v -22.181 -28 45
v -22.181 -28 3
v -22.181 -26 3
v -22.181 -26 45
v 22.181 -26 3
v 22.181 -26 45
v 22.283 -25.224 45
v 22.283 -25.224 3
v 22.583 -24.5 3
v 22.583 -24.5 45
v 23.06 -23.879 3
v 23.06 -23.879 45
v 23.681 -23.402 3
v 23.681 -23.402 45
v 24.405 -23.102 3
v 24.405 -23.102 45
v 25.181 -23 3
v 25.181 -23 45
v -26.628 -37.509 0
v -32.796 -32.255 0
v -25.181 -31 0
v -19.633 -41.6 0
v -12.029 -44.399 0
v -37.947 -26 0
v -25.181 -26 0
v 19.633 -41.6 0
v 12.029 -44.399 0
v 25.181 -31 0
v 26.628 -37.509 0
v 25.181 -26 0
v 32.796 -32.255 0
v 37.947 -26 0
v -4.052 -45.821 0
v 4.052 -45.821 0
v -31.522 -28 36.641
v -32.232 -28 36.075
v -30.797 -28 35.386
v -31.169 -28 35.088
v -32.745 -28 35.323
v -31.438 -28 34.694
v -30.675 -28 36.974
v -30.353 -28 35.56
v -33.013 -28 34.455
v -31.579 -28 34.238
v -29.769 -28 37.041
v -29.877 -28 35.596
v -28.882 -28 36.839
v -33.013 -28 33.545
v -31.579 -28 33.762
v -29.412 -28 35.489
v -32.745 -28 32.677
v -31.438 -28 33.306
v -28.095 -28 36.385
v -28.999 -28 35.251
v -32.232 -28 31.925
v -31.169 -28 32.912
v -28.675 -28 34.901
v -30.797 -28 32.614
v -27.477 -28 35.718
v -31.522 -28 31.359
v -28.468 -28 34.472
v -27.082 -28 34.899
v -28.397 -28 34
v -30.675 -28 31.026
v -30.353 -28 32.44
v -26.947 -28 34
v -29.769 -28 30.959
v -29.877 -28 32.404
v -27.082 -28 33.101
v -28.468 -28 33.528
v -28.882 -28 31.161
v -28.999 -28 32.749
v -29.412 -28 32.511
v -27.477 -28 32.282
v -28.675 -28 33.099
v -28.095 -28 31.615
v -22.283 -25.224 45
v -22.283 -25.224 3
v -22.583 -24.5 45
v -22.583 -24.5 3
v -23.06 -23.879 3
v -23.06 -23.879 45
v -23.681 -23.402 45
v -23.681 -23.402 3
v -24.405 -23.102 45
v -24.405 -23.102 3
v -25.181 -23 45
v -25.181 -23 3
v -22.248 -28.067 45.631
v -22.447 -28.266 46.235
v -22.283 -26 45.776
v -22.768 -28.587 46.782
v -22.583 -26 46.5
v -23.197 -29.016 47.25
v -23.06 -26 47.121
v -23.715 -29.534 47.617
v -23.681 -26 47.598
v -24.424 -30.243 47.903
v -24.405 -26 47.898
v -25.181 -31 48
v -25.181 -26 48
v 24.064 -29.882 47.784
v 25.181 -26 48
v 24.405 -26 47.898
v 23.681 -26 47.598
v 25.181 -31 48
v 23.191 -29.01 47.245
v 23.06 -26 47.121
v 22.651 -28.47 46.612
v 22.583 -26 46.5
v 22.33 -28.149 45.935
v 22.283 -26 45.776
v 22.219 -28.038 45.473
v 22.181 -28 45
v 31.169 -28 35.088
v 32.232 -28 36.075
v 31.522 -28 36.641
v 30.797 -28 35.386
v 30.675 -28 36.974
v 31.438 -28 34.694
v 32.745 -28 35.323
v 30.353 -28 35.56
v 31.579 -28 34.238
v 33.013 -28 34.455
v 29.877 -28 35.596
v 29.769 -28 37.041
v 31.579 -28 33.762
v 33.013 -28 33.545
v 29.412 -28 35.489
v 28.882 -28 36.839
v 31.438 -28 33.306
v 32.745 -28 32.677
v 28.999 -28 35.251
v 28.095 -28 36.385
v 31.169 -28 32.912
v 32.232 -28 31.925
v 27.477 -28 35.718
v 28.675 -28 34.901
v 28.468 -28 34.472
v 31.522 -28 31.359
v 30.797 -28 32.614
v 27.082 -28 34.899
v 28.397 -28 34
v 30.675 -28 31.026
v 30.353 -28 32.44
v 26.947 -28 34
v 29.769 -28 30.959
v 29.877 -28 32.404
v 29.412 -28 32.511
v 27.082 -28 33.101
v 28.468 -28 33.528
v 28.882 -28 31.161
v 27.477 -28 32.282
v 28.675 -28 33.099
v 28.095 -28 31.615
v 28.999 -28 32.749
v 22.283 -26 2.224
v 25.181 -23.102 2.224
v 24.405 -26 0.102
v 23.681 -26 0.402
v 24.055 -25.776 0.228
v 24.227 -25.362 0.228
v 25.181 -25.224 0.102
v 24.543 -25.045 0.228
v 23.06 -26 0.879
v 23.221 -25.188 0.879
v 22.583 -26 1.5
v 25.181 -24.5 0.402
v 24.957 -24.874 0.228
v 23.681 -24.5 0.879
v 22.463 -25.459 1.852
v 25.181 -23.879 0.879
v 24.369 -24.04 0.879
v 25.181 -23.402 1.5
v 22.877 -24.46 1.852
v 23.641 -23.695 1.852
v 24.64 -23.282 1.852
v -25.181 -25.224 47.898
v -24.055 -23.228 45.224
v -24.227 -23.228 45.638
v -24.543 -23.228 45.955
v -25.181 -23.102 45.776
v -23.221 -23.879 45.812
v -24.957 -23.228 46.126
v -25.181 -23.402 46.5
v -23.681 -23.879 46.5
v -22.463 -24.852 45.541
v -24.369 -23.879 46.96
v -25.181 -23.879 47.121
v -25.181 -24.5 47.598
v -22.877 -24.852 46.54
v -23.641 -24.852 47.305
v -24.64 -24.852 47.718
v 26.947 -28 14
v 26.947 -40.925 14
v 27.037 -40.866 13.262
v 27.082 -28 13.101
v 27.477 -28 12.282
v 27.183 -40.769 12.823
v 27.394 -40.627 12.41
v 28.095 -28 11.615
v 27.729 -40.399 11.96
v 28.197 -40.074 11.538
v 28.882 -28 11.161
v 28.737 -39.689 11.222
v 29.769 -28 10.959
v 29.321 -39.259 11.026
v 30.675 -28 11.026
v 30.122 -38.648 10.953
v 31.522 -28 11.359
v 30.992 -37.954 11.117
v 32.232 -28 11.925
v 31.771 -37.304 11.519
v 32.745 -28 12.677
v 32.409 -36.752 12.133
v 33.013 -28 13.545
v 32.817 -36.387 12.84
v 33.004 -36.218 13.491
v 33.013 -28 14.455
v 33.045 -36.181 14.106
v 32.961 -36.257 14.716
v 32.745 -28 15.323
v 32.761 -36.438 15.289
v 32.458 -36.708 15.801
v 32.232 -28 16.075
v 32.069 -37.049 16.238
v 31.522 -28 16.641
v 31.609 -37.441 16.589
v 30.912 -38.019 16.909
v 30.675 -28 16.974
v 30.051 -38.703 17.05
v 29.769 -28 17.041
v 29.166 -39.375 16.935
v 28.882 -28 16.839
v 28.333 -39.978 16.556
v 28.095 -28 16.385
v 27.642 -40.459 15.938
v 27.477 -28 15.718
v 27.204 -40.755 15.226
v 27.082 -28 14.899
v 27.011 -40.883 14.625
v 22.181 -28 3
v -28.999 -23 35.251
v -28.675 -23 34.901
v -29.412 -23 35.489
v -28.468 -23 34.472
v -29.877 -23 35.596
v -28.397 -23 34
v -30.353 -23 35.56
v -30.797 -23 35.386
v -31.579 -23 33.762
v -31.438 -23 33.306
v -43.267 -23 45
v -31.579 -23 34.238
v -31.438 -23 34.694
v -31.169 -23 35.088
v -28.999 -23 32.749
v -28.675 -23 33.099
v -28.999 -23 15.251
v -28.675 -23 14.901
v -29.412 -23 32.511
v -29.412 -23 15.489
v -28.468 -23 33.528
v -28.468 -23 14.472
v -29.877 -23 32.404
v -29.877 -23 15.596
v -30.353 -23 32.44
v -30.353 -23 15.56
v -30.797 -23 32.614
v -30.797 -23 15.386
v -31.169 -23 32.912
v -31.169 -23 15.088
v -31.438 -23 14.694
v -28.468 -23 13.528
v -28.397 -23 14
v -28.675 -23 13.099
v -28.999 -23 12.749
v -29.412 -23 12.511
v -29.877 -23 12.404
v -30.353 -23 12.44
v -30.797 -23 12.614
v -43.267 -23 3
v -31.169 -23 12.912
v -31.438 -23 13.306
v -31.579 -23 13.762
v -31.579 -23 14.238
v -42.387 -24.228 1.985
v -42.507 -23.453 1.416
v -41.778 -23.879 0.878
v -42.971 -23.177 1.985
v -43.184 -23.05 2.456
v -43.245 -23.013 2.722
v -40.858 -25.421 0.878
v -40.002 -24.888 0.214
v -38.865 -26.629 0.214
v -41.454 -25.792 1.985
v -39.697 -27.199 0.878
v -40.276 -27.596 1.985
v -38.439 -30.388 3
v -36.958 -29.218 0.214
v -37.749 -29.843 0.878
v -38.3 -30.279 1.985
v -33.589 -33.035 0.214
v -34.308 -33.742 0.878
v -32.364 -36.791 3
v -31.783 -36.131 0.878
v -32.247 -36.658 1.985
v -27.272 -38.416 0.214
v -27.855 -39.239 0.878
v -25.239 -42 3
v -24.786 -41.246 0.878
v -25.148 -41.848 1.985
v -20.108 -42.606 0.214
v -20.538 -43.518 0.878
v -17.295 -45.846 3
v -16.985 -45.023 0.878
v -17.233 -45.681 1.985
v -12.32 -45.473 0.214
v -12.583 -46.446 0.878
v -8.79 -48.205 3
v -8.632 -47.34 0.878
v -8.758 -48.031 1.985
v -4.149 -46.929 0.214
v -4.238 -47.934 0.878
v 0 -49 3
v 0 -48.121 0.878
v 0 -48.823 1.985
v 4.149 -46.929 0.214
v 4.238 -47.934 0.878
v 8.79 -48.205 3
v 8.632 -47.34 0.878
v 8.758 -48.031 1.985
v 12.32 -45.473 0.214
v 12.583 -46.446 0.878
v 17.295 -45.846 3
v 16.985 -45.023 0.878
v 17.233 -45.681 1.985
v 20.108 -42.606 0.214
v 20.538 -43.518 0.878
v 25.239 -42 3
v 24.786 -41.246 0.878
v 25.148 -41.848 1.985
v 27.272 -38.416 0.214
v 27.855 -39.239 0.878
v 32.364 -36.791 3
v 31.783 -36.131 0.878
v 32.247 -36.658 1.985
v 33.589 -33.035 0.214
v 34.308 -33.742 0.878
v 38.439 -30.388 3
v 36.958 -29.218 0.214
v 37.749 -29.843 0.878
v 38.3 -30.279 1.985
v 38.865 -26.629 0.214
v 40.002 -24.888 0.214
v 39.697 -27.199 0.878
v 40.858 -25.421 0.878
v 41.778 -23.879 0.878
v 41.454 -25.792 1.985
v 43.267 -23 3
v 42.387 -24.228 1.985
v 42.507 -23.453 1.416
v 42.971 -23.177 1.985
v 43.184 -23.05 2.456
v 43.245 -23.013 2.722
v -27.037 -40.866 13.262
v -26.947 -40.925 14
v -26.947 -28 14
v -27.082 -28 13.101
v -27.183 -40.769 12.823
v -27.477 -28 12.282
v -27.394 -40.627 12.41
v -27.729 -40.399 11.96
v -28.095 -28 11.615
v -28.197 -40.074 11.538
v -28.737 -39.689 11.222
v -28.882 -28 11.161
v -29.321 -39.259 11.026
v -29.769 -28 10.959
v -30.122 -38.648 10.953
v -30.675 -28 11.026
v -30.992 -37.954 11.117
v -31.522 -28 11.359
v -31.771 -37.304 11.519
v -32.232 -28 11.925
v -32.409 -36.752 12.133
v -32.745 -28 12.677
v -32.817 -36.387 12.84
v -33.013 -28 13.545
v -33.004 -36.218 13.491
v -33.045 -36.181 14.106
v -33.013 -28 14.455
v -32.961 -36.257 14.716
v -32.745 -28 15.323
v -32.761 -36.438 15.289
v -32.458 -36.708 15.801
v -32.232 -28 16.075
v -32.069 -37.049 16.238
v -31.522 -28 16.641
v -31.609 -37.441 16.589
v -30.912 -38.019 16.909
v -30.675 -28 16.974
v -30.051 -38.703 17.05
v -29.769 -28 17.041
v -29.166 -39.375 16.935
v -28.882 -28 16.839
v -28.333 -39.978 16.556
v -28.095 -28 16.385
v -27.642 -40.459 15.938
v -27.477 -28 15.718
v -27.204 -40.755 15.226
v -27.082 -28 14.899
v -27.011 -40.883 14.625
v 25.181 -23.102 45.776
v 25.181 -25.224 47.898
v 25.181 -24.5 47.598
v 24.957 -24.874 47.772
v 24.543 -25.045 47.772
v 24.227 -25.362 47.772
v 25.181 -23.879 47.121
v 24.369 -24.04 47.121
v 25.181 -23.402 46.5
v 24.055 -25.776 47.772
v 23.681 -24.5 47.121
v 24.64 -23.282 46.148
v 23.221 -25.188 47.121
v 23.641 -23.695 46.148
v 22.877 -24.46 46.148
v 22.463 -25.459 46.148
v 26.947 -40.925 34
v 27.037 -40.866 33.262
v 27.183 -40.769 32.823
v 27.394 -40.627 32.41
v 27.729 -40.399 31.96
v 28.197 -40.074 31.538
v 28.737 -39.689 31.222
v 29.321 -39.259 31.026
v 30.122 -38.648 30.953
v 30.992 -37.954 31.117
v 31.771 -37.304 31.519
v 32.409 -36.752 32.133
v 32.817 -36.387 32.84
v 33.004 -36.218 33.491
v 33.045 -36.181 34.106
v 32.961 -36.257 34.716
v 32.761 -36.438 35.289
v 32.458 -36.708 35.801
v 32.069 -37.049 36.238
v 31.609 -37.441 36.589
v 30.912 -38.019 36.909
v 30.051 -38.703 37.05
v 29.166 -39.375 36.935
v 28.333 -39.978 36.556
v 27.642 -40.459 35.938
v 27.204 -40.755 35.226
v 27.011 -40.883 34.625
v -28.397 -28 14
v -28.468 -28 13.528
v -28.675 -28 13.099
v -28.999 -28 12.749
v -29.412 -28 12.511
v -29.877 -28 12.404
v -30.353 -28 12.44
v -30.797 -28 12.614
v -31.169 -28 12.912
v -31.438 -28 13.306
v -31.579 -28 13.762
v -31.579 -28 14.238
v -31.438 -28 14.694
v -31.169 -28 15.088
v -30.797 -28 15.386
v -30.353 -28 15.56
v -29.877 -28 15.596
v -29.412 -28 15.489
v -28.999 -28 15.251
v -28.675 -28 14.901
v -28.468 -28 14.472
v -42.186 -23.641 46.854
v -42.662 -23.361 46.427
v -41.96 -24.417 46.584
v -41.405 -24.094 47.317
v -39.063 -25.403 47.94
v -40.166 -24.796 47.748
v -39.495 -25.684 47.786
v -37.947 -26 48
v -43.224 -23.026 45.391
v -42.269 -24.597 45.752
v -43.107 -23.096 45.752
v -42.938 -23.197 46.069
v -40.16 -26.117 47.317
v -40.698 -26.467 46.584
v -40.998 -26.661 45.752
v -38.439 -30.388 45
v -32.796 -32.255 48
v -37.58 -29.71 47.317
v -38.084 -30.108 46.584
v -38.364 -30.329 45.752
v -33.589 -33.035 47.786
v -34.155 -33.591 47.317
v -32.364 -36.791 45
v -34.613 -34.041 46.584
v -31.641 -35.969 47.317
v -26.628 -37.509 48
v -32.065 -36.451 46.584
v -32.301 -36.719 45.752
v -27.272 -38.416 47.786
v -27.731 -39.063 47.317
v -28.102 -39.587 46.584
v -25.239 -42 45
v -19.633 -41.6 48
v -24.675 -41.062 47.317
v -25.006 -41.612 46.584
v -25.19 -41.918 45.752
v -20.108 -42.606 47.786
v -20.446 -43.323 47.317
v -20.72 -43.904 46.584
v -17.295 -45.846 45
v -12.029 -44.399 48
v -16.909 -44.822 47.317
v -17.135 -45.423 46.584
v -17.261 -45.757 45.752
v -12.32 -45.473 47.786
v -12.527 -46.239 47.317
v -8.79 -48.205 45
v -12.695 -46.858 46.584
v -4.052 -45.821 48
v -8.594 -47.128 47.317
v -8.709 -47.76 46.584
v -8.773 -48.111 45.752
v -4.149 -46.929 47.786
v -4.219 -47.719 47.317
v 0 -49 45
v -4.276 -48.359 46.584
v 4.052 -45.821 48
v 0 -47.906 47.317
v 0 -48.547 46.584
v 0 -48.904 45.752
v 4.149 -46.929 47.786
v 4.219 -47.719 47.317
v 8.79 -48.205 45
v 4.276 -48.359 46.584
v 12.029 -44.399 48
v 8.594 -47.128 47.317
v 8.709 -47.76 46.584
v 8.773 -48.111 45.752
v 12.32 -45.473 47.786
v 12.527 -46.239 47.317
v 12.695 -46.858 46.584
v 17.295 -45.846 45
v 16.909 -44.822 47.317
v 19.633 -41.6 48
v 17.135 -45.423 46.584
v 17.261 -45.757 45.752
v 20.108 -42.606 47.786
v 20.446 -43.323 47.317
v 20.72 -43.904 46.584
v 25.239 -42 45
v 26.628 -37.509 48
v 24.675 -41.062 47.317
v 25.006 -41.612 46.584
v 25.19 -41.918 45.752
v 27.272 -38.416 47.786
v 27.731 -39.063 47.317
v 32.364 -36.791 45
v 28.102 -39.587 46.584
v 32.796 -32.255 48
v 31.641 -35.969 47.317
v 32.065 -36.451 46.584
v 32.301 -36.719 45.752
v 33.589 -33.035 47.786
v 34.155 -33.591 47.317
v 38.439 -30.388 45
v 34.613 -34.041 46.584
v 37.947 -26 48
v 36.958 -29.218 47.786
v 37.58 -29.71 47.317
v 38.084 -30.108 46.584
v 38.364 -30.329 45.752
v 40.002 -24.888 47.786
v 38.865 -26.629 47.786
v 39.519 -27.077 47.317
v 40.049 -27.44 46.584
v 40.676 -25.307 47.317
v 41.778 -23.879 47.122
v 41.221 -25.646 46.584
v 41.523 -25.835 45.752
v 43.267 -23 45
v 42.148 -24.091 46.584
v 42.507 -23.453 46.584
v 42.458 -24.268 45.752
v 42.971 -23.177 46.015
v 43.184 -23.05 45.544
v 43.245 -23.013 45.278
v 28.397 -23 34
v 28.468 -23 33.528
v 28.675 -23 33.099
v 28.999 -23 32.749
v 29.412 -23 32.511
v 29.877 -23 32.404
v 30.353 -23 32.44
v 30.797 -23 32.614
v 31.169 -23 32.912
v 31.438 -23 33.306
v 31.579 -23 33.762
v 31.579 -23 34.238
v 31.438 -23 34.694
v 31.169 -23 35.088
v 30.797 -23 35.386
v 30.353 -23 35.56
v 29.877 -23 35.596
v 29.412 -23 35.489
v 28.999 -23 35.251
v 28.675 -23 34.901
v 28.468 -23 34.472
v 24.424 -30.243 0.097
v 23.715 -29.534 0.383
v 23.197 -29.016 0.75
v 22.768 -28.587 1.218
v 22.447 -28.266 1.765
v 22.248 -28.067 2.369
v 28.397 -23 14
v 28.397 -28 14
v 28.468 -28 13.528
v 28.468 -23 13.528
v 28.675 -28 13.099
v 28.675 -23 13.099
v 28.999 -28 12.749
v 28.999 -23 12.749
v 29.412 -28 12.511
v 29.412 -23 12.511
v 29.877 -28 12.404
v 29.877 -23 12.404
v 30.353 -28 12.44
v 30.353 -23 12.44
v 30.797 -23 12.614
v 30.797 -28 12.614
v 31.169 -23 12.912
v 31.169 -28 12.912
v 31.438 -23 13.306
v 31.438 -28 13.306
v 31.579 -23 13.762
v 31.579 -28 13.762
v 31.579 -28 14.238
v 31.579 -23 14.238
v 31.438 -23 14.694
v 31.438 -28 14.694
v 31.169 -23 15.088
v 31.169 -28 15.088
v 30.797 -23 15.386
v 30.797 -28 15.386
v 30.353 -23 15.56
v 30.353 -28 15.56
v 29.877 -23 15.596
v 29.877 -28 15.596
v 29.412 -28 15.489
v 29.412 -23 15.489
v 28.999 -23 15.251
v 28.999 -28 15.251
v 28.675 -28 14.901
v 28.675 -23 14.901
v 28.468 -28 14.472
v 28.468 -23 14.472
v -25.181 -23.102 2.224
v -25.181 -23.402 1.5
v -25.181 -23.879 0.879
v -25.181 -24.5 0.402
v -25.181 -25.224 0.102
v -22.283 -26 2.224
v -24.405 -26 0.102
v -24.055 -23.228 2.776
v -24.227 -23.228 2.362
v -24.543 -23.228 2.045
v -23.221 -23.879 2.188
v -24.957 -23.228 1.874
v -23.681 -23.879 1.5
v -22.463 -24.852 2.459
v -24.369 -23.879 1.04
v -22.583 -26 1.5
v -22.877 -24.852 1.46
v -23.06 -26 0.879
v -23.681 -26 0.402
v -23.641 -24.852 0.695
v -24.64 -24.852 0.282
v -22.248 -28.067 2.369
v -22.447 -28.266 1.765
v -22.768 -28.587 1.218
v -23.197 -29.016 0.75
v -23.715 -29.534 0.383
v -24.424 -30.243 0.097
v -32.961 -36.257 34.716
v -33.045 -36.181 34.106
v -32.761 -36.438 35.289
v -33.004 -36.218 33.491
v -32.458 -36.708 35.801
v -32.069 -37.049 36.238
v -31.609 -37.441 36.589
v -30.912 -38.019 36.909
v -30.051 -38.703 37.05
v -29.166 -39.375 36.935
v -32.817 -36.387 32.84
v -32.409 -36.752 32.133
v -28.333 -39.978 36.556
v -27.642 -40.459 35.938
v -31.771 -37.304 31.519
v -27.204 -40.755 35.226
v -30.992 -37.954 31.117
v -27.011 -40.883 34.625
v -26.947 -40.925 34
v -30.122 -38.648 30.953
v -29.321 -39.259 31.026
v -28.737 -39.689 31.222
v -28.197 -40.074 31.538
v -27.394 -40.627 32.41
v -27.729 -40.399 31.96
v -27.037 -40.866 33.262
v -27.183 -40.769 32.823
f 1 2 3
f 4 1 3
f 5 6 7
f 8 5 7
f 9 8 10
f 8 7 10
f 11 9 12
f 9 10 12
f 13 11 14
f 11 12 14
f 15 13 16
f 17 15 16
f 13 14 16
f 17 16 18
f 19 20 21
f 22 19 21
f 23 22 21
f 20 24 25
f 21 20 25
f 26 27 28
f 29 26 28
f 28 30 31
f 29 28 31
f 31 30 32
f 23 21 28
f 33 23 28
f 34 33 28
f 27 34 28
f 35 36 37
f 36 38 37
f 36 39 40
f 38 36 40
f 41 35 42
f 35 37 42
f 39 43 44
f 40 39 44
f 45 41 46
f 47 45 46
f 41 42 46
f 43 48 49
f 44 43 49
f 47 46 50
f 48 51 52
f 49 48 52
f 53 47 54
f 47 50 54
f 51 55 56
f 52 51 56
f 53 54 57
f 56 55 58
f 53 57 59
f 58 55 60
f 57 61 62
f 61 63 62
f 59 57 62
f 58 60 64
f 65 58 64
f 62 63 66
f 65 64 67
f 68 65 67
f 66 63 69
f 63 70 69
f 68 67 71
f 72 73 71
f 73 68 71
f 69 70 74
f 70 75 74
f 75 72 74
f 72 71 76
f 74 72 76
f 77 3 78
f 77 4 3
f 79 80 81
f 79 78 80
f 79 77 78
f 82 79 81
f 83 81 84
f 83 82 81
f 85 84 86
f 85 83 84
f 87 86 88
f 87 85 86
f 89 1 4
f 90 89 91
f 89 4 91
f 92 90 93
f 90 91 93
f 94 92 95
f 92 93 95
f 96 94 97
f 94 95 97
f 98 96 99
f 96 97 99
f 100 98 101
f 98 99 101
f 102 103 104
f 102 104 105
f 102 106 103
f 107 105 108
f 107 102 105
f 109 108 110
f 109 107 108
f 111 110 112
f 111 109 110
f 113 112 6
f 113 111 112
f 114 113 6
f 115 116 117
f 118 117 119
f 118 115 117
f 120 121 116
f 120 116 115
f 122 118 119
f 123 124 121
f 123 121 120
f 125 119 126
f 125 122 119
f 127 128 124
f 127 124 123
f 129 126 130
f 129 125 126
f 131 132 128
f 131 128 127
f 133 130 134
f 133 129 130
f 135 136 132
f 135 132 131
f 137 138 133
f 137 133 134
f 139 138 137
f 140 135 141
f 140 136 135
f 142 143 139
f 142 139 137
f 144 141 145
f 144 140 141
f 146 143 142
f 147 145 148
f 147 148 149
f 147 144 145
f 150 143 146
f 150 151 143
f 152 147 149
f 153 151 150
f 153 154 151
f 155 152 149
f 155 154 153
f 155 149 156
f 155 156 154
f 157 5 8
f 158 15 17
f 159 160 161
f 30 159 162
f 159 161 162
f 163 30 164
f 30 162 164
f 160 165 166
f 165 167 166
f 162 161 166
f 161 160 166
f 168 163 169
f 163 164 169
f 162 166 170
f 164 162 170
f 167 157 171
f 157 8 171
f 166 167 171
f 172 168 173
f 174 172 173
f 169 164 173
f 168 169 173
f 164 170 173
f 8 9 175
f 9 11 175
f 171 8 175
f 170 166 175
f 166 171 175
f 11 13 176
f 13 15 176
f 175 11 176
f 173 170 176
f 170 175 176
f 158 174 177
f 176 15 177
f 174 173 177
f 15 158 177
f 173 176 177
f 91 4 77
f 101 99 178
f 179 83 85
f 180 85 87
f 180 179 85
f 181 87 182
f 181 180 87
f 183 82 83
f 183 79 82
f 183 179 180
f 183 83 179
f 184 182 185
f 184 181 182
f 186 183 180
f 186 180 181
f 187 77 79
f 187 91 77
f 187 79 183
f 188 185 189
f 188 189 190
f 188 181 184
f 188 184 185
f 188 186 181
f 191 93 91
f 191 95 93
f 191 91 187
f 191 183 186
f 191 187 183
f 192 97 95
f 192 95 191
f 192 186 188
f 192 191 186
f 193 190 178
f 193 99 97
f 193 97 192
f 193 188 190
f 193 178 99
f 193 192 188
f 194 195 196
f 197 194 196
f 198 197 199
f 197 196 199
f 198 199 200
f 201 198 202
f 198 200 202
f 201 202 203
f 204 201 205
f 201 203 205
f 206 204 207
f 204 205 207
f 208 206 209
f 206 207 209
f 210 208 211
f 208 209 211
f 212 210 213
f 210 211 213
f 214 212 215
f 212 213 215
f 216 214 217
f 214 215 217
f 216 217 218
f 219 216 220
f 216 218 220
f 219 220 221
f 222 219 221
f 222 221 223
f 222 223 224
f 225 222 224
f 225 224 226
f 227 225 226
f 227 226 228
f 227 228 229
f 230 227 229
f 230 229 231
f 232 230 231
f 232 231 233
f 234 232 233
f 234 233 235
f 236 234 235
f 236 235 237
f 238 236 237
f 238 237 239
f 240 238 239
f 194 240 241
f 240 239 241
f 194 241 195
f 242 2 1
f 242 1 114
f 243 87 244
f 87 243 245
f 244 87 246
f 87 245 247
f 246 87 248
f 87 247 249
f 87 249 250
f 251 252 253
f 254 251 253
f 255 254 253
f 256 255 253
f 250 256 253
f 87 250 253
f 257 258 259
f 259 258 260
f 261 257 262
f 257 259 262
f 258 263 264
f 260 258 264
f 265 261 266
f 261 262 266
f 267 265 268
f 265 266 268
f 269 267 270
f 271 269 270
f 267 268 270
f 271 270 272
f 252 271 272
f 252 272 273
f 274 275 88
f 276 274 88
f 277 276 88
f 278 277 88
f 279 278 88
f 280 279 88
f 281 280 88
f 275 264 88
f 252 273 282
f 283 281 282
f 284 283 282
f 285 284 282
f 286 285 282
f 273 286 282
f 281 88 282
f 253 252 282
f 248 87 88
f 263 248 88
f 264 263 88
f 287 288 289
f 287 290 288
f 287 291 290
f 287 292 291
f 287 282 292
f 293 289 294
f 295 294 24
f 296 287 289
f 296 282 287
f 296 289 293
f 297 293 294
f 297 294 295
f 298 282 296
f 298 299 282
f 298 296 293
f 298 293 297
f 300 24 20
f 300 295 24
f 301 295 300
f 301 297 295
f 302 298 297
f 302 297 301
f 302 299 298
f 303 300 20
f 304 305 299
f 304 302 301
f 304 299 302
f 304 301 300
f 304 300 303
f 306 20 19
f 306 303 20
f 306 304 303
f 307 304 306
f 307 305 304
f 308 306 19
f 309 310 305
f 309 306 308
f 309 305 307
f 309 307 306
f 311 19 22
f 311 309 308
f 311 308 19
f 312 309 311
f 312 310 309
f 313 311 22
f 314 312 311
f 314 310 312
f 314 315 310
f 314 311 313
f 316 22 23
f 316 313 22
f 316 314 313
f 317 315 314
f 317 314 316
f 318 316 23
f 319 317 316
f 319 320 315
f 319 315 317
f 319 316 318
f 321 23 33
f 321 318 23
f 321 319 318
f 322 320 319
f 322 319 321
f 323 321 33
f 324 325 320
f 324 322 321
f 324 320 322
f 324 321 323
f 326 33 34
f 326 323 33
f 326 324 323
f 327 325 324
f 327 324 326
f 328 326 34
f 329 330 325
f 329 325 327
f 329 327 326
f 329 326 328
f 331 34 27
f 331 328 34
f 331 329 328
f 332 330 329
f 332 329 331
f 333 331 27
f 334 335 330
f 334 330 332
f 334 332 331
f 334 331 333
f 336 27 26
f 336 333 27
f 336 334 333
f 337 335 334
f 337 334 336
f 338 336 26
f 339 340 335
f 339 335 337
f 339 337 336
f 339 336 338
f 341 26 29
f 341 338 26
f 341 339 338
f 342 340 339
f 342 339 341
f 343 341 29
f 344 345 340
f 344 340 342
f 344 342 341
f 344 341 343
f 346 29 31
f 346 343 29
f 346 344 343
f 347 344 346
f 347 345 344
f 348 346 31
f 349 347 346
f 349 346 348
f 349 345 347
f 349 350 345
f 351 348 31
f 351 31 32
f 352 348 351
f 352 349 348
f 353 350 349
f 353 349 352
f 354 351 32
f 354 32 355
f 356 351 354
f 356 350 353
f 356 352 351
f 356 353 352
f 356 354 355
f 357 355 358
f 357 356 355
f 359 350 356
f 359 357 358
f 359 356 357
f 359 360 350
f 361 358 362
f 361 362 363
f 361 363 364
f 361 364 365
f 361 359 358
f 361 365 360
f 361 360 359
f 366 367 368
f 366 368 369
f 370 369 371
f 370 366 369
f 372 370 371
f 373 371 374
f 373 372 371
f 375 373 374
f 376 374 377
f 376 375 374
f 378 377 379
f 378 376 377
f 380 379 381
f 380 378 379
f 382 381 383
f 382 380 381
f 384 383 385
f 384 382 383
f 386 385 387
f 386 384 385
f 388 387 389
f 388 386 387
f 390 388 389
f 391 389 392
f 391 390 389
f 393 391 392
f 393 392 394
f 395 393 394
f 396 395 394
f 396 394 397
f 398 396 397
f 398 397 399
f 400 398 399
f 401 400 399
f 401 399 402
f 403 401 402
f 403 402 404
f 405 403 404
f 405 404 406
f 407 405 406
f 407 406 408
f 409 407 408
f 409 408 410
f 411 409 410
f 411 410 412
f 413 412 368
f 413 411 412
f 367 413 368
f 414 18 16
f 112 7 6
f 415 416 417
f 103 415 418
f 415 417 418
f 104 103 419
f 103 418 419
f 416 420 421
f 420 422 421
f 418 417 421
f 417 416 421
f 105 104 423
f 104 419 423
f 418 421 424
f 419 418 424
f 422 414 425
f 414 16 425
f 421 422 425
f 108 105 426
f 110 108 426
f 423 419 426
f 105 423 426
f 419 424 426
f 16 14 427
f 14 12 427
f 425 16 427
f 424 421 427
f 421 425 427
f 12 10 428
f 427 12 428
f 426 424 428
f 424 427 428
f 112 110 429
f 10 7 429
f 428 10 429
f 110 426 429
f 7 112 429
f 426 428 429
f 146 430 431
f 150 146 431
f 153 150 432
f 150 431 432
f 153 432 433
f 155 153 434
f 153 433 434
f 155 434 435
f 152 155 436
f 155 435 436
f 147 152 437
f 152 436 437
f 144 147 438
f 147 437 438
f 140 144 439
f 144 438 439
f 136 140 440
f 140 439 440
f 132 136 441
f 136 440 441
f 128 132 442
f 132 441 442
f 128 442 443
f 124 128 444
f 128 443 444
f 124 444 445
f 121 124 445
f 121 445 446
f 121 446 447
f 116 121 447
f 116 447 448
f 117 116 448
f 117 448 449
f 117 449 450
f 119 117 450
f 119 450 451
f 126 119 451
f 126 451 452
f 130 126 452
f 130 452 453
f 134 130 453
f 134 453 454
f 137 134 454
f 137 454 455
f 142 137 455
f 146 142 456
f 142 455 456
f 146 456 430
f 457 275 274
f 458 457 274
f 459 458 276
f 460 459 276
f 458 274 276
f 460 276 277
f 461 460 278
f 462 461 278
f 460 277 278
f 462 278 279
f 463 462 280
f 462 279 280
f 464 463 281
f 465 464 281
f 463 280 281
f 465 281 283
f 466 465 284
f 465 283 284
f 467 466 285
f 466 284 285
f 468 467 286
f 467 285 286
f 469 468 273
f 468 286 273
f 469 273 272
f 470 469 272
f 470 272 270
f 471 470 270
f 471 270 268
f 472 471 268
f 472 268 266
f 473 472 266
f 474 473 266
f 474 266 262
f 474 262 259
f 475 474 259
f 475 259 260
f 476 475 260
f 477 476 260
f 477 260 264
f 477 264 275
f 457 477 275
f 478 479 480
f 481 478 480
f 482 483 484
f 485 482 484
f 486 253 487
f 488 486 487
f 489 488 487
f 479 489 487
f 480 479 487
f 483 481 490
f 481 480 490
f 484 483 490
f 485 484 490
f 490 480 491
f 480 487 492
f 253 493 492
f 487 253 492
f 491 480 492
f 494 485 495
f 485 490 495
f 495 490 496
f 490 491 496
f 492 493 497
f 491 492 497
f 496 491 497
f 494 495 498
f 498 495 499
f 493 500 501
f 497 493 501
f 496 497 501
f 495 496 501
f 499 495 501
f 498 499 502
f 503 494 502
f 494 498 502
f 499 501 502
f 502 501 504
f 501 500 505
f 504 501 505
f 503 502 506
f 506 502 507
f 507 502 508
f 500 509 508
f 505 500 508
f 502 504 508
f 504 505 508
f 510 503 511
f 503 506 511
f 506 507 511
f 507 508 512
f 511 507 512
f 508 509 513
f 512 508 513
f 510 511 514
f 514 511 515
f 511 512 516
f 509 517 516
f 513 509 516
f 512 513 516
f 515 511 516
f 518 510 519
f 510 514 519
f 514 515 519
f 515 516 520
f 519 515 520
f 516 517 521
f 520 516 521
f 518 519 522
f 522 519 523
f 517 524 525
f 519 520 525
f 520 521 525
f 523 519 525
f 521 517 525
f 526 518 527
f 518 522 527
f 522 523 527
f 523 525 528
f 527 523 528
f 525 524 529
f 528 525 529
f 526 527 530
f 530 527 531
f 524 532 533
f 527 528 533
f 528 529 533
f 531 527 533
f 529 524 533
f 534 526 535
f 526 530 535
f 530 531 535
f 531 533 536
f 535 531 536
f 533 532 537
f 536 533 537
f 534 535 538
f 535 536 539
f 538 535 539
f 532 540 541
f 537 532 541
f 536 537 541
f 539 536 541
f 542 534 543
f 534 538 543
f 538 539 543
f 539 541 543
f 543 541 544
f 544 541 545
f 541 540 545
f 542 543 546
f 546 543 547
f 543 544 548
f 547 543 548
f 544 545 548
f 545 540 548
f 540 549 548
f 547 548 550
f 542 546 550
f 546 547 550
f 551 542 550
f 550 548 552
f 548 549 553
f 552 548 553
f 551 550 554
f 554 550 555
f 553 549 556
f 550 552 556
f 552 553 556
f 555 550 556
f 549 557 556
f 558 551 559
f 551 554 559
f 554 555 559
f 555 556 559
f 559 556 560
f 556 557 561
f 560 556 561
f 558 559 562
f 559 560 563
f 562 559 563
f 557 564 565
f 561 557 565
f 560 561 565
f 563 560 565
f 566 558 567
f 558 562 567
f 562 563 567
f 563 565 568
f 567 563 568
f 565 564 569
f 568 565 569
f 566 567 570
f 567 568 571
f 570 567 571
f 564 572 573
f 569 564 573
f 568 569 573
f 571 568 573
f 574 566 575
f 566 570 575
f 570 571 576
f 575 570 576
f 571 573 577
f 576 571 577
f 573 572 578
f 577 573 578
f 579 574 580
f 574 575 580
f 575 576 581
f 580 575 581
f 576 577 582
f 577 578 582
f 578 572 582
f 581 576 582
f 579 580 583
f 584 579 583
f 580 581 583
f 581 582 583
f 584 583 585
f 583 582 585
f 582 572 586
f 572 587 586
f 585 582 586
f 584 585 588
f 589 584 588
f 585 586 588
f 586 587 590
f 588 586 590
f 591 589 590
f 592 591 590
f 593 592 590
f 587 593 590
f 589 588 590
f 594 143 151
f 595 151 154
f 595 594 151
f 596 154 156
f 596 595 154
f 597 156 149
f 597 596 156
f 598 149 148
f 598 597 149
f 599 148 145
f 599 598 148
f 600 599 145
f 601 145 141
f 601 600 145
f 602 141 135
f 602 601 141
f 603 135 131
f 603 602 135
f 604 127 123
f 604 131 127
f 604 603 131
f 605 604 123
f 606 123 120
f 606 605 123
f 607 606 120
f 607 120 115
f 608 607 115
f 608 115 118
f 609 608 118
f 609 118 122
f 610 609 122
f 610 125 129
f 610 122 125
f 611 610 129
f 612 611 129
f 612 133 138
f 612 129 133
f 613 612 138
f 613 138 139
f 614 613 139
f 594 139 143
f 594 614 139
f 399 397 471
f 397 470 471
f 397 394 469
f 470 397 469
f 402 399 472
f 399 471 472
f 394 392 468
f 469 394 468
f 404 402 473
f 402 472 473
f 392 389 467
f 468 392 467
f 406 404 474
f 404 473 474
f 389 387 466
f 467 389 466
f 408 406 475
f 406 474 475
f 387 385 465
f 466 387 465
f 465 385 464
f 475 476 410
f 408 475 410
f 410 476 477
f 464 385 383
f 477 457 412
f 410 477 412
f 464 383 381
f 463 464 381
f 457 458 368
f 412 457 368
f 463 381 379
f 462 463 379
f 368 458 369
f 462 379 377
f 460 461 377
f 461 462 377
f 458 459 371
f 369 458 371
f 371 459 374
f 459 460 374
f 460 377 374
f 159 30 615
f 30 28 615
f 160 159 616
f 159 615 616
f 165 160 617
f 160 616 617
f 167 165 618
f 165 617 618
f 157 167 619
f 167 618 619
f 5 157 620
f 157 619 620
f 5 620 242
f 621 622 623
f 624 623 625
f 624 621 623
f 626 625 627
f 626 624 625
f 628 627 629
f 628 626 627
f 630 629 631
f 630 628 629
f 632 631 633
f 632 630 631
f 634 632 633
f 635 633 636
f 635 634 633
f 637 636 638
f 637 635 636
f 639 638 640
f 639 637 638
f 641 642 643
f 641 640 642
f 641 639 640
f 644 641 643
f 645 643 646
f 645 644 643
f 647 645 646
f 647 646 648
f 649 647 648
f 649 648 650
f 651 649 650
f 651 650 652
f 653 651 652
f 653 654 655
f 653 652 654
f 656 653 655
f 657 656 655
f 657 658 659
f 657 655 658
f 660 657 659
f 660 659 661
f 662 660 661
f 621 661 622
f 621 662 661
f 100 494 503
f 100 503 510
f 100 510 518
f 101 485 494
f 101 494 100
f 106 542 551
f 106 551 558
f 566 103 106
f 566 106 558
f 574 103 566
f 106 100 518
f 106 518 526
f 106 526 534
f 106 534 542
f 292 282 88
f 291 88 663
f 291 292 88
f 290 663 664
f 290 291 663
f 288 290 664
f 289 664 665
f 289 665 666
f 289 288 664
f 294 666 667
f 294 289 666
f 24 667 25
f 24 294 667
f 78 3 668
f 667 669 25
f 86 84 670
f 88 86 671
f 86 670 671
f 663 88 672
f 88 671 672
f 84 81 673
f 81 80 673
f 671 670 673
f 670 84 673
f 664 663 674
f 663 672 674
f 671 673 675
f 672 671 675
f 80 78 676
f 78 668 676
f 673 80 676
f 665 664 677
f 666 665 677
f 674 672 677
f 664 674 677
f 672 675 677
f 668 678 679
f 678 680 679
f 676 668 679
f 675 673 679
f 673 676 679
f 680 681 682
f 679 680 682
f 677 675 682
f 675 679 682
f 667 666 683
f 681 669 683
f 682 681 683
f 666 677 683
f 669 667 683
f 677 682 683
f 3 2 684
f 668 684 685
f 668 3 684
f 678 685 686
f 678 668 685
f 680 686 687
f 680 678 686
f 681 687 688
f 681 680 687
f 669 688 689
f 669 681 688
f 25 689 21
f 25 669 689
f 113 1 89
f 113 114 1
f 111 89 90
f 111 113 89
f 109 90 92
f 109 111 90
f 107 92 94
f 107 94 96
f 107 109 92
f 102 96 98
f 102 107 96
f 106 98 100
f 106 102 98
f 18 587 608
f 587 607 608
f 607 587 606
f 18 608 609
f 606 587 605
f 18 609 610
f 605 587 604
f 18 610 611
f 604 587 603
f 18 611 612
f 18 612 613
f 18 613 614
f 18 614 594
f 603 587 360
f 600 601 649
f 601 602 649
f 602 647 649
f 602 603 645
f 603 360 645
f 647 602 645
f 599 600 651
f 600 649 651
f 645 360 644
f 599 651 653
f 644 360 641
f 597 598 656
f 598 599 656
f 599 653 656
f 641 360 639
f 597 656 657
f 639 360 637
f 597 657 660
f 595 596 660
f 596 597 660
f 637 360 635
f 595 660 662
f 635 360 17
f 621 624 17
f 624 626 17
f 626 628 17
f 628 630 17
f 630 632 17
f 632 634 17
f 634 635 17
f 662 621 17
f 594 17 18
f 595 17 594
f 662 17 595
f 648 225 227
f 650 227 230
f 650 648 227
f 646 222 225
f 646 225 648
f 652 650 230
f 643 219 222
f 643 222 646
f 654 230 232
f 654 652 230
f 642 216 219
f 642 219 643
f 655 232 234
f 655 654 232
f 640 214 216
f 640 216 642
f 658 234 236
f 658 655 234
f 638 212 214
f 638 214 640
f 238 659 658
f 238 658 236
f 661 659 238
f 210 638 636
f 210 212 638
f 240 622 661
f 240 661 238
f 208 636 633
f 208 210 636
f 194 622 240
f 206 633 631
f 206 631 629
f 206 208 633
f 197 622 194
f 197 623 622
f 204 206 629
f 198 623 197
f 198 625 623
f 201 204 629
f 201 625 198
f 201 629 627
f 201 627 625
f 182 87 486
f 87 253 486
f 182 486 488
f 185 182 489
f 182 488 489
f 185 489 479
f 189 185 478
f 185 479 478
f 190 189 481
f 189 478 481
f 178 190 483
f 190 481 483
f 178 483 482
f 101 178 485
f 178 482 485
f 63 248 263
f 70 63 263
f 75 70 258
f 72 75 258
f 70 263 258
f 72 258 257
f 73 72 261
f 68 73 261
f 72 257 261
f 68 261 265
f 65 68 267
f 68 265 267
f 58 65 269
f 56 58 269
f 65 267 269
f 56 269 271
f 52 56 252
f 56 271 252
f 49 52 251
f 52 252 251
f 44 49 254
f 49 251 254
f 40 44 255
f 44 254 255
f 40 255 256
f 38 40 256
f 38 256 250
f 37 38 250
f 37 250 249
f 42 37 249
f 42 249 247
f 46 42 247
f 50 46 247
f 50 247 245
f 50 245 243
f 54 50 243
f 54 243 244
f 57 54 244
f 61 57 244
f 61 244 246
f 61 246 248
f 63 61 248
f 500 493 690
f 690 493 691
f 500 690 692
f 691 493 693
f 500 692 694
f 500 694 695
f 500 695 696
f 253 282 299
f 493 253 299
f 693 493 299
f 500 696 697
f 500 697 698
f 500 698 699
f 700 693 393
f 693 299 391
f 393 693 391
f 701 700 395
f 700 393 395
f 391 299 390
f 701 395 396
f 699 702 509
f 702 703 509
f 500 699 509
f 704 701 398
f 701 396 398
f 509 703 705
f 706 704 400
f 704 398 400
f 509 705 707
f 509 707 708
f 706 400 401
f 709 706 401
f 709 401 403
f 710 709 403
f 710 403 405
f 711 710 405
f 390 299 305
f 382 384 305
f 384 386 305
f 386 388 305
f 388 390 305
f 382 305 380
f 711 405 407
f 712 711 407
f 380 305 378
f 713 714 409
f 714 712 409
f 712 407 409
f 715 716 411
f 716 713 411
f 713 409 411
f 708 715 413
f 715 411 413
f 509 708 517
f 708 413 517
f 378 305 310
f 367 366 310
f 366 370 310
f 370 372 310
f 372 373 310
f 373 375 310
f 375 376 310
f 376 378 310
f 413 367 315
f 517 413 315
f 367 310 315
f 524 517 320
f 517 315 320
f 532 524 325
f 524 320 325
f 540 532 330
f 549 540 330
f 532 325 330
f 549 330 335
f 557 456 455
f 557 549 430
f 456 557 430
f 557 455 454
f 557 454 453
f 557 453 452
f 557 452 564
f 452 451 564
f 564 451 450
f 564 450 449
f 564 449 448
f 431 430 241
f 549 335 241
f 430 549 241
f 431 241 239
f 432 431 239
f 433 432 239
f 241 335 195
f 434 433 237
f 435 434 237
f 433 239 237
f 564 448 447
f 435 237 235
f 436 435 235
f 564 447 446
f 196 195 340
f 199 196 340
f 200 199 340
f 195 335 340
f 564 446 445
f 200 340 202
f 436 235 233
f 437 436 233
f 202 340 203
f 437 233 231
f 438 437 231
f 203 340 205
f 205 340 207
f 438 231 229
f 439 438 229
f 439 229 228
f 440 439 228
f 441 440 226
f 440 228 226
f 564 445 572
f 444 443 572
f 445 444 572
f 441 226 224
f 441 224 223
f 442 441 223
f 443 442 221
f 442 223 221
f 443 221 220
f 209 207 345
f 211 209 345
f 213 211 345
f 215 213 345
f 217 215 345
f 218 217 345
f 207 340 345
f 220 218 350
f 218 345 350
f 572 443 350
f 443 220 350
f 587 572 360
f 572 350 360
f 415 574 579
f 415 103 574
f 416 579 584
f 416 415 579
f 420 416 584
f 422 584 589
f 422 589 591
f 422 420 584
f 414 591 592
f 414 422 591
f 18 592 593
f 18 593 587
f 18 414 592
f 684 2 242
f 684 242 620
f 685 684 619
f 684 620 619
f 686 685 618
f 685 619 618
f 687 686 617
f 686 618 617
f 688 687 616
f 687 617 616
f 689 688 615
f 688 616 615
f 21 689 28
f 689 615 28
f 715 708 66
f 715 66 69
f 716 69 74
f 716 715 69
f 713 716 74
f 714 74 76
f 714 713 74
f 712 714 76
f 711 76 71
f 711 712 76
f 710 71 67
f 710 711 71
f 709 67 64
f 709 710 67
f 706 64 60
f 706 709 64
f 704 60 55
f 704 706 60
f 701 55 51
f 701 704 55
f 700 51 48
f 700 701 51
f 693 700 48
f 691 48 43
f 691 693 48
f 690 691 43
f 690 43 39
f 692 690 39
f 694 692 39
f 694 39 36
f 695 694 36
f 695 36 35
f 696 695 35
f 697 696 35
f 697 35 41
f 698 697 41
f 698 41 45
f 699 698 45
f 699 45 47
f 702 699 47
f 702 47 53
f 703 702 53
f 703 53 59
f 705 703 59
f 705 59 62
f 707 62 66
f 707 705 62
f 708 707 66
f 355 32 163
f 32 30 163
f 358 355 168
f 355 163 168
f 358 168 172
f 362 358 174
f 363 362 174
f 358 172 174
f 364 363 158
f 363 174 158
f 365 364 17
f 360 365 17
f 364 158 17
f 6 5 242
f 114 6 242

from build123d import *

# Parameters (mm, degrees)
SKETCH1_W           = 44.362146026
SKETCH1_H           = 10
BOSS_EXTRUDE1_DEPTH = 48
SKETCH2_R           = 1.6
CUT_EXTRUDE1_DEPTH  = 27
CUT_EXTRUDE2_START  = -17.925297
SKETCH3_R           = 3.05
CUT_EXTRUDE2_DEPTH  = 12.925297
FILLET1_R           = 3


with BuildPart() as part:
    # Sketch1 → Boss-Extrude1 (new body)
    with BuildSketch(Plane.XY):
        with BuildLine():
            Line((22.181073013, -38), (-22.181073013, -38))
            ThreePointArc((-22.181073013, -38), (0, -44), (22.181073013, -38))
        make_face()
        with BuildLine():
            Line((-37.509998667, -23), (-43.266615306, -23))
            ThreePointArc((-43.266615306, -23), (0, -49), (43.266615306, -23))
            Line((43.266615306, -23), (37.509998667, -23))
            ThreePointArc((37.509998667, -23), (35.812927639, -25.562359318), (33.941125497, -28))
            ThreePointArc((33.941125497, -28), (28.503075122, -33.519765939), (22.181073013, -38))
            ThreePointArc((22.181073013, -38), (0, -44), (-22.181073013, -38))
            ThreePointArc((-22.181073013, -38), (-28.503075122, -33.519765939), (-33.941125497, -28))
            ThreePointArc((-33.941125497, -28), (-35.812927639, -25.562359318), (-37.509998667, -23))
        make_face()
        with BuildLine():
            Line((-29.953929645, -23), (-37.509998667, -23))
            ThreePointArc((-37.509998667, -23), (-35.812927639, -25.562359318), (-33.941125497, -28))
            Line((-33.941125497, -28), (-22.181073013, -28))
            Line((-22.181073013, -28), (-22.181073013, -23))
            Line((-22.181073013, -23), (-29.953929645, -23))
        make_face()
        with BuildLine():
            Line((-22.181073013, -28), (-33.941125497, -28))
            ThreePointArc((-33.941125497, -28), (-28.503075122, -33.519765939), (-22.181073013, -38))
            Line((-22.181073013, -38), (-22.181073013, -28))
        make_face()
        with BuildLine():
            ThreePointArc((33.941125497, -28), (35.812927639, -25.562359318), (37.509998667, -23))
            Line((37.509998667, -23), (22.181073013, -23))
            Line((22.181073013, -23), (22.181073013, -28))
            Line((22.181073013, -28), (33.941125497, -28))
        make_face()
        with BuildLine():
            ThreePointArc((22.181073013, -38), (28.503075122, -33.519765939), (33.941125497, -28))
            Line((33.941125497, -28), (22.181073013, -28))
            Line((22.181073013, -28), (22.181073013, -38))
        make_face()
        with Locations((0, -33)):
            Rectangle(SKETCH1_W, SKETCH1_H)
    extrude(amount=BOSS_EXTRUDE1_DEPTH)

    # Sketch2 → Cut-Extrude1 (cut, through all)
    with BuildSketch(Plane(origin=(0, -23, 0), x_dir=(1, 0, 0), z_dir=(0, 1, 0))):
        with Locations((-29.996615306, -14)):
            Circle(SKETCH2_R)
        with Locations((-29.996615306, -34)):
            Circle(SKETCH2_R)
    cut_extrude1 = extrude(amount=-CUT_EXTRUDE1_DEPTH, mode=Mode.SUBTRACT)

    # Sketch3 → Cut-Extrude2 (cut)
    with BuildSketch(Plane(origin=(0, -23, 0), x_dir=(1, 0, 0), z_dir=(0, 1, 0)).offset(CUT_EXTRUDE2_START)):
        with Locations((-29.996615306, -14)):
            Circle(SKETCH3_R)
        with Locations((-29.996615306, -34)):
            Circle(SKETCH3_R)
    cut_extrude2 = extrude(amount=CUT_EXTRUDE2_DEPTH, mode=Mode.SUBTRACT)

    # Mirror1: Cut-Extrude1, Cut-Extrude2 across plane
    add(cut_extrude1.mirror(Plane(origin=(0, 0, 0), x_dir=(0, 0, 1), z_dir=(1, 0, 0))), mode=Mode.SUBTRACT)
    add(cut_extrude2.mirror(Plane(origin=(0, 0, 0), x_dir=(0, 0, 1), z_dir=(1, 0, 0))), mode=Mode.SUBTRACT)

    # Fillet1
    fillet1_edges = [part.edges().sort_by_distance(p)[0] for p in [
        (-22.181073013, -25.5, 48),
        (-22.181073013, -25.5, 0),
        (0, -28, 0),
        (22.181073013, -23, 24),
        (-22.181073013, -23, 24),
        (-32.723844159, -23, 48),
        (0, -49, 48),
        (32.723844159, -23, 48),
        (22.181073013, -25.5, 48),
        (0, -28, 48),
        (22.181073013, -25.5, 0),
        (32.723844159, -23, 0),
        (0, -49, 0),
        (-32.723844159, -23, 0),
    ]]
    fillet(fillet1_edges, radius=FILLET1_R)


solid = part.part
